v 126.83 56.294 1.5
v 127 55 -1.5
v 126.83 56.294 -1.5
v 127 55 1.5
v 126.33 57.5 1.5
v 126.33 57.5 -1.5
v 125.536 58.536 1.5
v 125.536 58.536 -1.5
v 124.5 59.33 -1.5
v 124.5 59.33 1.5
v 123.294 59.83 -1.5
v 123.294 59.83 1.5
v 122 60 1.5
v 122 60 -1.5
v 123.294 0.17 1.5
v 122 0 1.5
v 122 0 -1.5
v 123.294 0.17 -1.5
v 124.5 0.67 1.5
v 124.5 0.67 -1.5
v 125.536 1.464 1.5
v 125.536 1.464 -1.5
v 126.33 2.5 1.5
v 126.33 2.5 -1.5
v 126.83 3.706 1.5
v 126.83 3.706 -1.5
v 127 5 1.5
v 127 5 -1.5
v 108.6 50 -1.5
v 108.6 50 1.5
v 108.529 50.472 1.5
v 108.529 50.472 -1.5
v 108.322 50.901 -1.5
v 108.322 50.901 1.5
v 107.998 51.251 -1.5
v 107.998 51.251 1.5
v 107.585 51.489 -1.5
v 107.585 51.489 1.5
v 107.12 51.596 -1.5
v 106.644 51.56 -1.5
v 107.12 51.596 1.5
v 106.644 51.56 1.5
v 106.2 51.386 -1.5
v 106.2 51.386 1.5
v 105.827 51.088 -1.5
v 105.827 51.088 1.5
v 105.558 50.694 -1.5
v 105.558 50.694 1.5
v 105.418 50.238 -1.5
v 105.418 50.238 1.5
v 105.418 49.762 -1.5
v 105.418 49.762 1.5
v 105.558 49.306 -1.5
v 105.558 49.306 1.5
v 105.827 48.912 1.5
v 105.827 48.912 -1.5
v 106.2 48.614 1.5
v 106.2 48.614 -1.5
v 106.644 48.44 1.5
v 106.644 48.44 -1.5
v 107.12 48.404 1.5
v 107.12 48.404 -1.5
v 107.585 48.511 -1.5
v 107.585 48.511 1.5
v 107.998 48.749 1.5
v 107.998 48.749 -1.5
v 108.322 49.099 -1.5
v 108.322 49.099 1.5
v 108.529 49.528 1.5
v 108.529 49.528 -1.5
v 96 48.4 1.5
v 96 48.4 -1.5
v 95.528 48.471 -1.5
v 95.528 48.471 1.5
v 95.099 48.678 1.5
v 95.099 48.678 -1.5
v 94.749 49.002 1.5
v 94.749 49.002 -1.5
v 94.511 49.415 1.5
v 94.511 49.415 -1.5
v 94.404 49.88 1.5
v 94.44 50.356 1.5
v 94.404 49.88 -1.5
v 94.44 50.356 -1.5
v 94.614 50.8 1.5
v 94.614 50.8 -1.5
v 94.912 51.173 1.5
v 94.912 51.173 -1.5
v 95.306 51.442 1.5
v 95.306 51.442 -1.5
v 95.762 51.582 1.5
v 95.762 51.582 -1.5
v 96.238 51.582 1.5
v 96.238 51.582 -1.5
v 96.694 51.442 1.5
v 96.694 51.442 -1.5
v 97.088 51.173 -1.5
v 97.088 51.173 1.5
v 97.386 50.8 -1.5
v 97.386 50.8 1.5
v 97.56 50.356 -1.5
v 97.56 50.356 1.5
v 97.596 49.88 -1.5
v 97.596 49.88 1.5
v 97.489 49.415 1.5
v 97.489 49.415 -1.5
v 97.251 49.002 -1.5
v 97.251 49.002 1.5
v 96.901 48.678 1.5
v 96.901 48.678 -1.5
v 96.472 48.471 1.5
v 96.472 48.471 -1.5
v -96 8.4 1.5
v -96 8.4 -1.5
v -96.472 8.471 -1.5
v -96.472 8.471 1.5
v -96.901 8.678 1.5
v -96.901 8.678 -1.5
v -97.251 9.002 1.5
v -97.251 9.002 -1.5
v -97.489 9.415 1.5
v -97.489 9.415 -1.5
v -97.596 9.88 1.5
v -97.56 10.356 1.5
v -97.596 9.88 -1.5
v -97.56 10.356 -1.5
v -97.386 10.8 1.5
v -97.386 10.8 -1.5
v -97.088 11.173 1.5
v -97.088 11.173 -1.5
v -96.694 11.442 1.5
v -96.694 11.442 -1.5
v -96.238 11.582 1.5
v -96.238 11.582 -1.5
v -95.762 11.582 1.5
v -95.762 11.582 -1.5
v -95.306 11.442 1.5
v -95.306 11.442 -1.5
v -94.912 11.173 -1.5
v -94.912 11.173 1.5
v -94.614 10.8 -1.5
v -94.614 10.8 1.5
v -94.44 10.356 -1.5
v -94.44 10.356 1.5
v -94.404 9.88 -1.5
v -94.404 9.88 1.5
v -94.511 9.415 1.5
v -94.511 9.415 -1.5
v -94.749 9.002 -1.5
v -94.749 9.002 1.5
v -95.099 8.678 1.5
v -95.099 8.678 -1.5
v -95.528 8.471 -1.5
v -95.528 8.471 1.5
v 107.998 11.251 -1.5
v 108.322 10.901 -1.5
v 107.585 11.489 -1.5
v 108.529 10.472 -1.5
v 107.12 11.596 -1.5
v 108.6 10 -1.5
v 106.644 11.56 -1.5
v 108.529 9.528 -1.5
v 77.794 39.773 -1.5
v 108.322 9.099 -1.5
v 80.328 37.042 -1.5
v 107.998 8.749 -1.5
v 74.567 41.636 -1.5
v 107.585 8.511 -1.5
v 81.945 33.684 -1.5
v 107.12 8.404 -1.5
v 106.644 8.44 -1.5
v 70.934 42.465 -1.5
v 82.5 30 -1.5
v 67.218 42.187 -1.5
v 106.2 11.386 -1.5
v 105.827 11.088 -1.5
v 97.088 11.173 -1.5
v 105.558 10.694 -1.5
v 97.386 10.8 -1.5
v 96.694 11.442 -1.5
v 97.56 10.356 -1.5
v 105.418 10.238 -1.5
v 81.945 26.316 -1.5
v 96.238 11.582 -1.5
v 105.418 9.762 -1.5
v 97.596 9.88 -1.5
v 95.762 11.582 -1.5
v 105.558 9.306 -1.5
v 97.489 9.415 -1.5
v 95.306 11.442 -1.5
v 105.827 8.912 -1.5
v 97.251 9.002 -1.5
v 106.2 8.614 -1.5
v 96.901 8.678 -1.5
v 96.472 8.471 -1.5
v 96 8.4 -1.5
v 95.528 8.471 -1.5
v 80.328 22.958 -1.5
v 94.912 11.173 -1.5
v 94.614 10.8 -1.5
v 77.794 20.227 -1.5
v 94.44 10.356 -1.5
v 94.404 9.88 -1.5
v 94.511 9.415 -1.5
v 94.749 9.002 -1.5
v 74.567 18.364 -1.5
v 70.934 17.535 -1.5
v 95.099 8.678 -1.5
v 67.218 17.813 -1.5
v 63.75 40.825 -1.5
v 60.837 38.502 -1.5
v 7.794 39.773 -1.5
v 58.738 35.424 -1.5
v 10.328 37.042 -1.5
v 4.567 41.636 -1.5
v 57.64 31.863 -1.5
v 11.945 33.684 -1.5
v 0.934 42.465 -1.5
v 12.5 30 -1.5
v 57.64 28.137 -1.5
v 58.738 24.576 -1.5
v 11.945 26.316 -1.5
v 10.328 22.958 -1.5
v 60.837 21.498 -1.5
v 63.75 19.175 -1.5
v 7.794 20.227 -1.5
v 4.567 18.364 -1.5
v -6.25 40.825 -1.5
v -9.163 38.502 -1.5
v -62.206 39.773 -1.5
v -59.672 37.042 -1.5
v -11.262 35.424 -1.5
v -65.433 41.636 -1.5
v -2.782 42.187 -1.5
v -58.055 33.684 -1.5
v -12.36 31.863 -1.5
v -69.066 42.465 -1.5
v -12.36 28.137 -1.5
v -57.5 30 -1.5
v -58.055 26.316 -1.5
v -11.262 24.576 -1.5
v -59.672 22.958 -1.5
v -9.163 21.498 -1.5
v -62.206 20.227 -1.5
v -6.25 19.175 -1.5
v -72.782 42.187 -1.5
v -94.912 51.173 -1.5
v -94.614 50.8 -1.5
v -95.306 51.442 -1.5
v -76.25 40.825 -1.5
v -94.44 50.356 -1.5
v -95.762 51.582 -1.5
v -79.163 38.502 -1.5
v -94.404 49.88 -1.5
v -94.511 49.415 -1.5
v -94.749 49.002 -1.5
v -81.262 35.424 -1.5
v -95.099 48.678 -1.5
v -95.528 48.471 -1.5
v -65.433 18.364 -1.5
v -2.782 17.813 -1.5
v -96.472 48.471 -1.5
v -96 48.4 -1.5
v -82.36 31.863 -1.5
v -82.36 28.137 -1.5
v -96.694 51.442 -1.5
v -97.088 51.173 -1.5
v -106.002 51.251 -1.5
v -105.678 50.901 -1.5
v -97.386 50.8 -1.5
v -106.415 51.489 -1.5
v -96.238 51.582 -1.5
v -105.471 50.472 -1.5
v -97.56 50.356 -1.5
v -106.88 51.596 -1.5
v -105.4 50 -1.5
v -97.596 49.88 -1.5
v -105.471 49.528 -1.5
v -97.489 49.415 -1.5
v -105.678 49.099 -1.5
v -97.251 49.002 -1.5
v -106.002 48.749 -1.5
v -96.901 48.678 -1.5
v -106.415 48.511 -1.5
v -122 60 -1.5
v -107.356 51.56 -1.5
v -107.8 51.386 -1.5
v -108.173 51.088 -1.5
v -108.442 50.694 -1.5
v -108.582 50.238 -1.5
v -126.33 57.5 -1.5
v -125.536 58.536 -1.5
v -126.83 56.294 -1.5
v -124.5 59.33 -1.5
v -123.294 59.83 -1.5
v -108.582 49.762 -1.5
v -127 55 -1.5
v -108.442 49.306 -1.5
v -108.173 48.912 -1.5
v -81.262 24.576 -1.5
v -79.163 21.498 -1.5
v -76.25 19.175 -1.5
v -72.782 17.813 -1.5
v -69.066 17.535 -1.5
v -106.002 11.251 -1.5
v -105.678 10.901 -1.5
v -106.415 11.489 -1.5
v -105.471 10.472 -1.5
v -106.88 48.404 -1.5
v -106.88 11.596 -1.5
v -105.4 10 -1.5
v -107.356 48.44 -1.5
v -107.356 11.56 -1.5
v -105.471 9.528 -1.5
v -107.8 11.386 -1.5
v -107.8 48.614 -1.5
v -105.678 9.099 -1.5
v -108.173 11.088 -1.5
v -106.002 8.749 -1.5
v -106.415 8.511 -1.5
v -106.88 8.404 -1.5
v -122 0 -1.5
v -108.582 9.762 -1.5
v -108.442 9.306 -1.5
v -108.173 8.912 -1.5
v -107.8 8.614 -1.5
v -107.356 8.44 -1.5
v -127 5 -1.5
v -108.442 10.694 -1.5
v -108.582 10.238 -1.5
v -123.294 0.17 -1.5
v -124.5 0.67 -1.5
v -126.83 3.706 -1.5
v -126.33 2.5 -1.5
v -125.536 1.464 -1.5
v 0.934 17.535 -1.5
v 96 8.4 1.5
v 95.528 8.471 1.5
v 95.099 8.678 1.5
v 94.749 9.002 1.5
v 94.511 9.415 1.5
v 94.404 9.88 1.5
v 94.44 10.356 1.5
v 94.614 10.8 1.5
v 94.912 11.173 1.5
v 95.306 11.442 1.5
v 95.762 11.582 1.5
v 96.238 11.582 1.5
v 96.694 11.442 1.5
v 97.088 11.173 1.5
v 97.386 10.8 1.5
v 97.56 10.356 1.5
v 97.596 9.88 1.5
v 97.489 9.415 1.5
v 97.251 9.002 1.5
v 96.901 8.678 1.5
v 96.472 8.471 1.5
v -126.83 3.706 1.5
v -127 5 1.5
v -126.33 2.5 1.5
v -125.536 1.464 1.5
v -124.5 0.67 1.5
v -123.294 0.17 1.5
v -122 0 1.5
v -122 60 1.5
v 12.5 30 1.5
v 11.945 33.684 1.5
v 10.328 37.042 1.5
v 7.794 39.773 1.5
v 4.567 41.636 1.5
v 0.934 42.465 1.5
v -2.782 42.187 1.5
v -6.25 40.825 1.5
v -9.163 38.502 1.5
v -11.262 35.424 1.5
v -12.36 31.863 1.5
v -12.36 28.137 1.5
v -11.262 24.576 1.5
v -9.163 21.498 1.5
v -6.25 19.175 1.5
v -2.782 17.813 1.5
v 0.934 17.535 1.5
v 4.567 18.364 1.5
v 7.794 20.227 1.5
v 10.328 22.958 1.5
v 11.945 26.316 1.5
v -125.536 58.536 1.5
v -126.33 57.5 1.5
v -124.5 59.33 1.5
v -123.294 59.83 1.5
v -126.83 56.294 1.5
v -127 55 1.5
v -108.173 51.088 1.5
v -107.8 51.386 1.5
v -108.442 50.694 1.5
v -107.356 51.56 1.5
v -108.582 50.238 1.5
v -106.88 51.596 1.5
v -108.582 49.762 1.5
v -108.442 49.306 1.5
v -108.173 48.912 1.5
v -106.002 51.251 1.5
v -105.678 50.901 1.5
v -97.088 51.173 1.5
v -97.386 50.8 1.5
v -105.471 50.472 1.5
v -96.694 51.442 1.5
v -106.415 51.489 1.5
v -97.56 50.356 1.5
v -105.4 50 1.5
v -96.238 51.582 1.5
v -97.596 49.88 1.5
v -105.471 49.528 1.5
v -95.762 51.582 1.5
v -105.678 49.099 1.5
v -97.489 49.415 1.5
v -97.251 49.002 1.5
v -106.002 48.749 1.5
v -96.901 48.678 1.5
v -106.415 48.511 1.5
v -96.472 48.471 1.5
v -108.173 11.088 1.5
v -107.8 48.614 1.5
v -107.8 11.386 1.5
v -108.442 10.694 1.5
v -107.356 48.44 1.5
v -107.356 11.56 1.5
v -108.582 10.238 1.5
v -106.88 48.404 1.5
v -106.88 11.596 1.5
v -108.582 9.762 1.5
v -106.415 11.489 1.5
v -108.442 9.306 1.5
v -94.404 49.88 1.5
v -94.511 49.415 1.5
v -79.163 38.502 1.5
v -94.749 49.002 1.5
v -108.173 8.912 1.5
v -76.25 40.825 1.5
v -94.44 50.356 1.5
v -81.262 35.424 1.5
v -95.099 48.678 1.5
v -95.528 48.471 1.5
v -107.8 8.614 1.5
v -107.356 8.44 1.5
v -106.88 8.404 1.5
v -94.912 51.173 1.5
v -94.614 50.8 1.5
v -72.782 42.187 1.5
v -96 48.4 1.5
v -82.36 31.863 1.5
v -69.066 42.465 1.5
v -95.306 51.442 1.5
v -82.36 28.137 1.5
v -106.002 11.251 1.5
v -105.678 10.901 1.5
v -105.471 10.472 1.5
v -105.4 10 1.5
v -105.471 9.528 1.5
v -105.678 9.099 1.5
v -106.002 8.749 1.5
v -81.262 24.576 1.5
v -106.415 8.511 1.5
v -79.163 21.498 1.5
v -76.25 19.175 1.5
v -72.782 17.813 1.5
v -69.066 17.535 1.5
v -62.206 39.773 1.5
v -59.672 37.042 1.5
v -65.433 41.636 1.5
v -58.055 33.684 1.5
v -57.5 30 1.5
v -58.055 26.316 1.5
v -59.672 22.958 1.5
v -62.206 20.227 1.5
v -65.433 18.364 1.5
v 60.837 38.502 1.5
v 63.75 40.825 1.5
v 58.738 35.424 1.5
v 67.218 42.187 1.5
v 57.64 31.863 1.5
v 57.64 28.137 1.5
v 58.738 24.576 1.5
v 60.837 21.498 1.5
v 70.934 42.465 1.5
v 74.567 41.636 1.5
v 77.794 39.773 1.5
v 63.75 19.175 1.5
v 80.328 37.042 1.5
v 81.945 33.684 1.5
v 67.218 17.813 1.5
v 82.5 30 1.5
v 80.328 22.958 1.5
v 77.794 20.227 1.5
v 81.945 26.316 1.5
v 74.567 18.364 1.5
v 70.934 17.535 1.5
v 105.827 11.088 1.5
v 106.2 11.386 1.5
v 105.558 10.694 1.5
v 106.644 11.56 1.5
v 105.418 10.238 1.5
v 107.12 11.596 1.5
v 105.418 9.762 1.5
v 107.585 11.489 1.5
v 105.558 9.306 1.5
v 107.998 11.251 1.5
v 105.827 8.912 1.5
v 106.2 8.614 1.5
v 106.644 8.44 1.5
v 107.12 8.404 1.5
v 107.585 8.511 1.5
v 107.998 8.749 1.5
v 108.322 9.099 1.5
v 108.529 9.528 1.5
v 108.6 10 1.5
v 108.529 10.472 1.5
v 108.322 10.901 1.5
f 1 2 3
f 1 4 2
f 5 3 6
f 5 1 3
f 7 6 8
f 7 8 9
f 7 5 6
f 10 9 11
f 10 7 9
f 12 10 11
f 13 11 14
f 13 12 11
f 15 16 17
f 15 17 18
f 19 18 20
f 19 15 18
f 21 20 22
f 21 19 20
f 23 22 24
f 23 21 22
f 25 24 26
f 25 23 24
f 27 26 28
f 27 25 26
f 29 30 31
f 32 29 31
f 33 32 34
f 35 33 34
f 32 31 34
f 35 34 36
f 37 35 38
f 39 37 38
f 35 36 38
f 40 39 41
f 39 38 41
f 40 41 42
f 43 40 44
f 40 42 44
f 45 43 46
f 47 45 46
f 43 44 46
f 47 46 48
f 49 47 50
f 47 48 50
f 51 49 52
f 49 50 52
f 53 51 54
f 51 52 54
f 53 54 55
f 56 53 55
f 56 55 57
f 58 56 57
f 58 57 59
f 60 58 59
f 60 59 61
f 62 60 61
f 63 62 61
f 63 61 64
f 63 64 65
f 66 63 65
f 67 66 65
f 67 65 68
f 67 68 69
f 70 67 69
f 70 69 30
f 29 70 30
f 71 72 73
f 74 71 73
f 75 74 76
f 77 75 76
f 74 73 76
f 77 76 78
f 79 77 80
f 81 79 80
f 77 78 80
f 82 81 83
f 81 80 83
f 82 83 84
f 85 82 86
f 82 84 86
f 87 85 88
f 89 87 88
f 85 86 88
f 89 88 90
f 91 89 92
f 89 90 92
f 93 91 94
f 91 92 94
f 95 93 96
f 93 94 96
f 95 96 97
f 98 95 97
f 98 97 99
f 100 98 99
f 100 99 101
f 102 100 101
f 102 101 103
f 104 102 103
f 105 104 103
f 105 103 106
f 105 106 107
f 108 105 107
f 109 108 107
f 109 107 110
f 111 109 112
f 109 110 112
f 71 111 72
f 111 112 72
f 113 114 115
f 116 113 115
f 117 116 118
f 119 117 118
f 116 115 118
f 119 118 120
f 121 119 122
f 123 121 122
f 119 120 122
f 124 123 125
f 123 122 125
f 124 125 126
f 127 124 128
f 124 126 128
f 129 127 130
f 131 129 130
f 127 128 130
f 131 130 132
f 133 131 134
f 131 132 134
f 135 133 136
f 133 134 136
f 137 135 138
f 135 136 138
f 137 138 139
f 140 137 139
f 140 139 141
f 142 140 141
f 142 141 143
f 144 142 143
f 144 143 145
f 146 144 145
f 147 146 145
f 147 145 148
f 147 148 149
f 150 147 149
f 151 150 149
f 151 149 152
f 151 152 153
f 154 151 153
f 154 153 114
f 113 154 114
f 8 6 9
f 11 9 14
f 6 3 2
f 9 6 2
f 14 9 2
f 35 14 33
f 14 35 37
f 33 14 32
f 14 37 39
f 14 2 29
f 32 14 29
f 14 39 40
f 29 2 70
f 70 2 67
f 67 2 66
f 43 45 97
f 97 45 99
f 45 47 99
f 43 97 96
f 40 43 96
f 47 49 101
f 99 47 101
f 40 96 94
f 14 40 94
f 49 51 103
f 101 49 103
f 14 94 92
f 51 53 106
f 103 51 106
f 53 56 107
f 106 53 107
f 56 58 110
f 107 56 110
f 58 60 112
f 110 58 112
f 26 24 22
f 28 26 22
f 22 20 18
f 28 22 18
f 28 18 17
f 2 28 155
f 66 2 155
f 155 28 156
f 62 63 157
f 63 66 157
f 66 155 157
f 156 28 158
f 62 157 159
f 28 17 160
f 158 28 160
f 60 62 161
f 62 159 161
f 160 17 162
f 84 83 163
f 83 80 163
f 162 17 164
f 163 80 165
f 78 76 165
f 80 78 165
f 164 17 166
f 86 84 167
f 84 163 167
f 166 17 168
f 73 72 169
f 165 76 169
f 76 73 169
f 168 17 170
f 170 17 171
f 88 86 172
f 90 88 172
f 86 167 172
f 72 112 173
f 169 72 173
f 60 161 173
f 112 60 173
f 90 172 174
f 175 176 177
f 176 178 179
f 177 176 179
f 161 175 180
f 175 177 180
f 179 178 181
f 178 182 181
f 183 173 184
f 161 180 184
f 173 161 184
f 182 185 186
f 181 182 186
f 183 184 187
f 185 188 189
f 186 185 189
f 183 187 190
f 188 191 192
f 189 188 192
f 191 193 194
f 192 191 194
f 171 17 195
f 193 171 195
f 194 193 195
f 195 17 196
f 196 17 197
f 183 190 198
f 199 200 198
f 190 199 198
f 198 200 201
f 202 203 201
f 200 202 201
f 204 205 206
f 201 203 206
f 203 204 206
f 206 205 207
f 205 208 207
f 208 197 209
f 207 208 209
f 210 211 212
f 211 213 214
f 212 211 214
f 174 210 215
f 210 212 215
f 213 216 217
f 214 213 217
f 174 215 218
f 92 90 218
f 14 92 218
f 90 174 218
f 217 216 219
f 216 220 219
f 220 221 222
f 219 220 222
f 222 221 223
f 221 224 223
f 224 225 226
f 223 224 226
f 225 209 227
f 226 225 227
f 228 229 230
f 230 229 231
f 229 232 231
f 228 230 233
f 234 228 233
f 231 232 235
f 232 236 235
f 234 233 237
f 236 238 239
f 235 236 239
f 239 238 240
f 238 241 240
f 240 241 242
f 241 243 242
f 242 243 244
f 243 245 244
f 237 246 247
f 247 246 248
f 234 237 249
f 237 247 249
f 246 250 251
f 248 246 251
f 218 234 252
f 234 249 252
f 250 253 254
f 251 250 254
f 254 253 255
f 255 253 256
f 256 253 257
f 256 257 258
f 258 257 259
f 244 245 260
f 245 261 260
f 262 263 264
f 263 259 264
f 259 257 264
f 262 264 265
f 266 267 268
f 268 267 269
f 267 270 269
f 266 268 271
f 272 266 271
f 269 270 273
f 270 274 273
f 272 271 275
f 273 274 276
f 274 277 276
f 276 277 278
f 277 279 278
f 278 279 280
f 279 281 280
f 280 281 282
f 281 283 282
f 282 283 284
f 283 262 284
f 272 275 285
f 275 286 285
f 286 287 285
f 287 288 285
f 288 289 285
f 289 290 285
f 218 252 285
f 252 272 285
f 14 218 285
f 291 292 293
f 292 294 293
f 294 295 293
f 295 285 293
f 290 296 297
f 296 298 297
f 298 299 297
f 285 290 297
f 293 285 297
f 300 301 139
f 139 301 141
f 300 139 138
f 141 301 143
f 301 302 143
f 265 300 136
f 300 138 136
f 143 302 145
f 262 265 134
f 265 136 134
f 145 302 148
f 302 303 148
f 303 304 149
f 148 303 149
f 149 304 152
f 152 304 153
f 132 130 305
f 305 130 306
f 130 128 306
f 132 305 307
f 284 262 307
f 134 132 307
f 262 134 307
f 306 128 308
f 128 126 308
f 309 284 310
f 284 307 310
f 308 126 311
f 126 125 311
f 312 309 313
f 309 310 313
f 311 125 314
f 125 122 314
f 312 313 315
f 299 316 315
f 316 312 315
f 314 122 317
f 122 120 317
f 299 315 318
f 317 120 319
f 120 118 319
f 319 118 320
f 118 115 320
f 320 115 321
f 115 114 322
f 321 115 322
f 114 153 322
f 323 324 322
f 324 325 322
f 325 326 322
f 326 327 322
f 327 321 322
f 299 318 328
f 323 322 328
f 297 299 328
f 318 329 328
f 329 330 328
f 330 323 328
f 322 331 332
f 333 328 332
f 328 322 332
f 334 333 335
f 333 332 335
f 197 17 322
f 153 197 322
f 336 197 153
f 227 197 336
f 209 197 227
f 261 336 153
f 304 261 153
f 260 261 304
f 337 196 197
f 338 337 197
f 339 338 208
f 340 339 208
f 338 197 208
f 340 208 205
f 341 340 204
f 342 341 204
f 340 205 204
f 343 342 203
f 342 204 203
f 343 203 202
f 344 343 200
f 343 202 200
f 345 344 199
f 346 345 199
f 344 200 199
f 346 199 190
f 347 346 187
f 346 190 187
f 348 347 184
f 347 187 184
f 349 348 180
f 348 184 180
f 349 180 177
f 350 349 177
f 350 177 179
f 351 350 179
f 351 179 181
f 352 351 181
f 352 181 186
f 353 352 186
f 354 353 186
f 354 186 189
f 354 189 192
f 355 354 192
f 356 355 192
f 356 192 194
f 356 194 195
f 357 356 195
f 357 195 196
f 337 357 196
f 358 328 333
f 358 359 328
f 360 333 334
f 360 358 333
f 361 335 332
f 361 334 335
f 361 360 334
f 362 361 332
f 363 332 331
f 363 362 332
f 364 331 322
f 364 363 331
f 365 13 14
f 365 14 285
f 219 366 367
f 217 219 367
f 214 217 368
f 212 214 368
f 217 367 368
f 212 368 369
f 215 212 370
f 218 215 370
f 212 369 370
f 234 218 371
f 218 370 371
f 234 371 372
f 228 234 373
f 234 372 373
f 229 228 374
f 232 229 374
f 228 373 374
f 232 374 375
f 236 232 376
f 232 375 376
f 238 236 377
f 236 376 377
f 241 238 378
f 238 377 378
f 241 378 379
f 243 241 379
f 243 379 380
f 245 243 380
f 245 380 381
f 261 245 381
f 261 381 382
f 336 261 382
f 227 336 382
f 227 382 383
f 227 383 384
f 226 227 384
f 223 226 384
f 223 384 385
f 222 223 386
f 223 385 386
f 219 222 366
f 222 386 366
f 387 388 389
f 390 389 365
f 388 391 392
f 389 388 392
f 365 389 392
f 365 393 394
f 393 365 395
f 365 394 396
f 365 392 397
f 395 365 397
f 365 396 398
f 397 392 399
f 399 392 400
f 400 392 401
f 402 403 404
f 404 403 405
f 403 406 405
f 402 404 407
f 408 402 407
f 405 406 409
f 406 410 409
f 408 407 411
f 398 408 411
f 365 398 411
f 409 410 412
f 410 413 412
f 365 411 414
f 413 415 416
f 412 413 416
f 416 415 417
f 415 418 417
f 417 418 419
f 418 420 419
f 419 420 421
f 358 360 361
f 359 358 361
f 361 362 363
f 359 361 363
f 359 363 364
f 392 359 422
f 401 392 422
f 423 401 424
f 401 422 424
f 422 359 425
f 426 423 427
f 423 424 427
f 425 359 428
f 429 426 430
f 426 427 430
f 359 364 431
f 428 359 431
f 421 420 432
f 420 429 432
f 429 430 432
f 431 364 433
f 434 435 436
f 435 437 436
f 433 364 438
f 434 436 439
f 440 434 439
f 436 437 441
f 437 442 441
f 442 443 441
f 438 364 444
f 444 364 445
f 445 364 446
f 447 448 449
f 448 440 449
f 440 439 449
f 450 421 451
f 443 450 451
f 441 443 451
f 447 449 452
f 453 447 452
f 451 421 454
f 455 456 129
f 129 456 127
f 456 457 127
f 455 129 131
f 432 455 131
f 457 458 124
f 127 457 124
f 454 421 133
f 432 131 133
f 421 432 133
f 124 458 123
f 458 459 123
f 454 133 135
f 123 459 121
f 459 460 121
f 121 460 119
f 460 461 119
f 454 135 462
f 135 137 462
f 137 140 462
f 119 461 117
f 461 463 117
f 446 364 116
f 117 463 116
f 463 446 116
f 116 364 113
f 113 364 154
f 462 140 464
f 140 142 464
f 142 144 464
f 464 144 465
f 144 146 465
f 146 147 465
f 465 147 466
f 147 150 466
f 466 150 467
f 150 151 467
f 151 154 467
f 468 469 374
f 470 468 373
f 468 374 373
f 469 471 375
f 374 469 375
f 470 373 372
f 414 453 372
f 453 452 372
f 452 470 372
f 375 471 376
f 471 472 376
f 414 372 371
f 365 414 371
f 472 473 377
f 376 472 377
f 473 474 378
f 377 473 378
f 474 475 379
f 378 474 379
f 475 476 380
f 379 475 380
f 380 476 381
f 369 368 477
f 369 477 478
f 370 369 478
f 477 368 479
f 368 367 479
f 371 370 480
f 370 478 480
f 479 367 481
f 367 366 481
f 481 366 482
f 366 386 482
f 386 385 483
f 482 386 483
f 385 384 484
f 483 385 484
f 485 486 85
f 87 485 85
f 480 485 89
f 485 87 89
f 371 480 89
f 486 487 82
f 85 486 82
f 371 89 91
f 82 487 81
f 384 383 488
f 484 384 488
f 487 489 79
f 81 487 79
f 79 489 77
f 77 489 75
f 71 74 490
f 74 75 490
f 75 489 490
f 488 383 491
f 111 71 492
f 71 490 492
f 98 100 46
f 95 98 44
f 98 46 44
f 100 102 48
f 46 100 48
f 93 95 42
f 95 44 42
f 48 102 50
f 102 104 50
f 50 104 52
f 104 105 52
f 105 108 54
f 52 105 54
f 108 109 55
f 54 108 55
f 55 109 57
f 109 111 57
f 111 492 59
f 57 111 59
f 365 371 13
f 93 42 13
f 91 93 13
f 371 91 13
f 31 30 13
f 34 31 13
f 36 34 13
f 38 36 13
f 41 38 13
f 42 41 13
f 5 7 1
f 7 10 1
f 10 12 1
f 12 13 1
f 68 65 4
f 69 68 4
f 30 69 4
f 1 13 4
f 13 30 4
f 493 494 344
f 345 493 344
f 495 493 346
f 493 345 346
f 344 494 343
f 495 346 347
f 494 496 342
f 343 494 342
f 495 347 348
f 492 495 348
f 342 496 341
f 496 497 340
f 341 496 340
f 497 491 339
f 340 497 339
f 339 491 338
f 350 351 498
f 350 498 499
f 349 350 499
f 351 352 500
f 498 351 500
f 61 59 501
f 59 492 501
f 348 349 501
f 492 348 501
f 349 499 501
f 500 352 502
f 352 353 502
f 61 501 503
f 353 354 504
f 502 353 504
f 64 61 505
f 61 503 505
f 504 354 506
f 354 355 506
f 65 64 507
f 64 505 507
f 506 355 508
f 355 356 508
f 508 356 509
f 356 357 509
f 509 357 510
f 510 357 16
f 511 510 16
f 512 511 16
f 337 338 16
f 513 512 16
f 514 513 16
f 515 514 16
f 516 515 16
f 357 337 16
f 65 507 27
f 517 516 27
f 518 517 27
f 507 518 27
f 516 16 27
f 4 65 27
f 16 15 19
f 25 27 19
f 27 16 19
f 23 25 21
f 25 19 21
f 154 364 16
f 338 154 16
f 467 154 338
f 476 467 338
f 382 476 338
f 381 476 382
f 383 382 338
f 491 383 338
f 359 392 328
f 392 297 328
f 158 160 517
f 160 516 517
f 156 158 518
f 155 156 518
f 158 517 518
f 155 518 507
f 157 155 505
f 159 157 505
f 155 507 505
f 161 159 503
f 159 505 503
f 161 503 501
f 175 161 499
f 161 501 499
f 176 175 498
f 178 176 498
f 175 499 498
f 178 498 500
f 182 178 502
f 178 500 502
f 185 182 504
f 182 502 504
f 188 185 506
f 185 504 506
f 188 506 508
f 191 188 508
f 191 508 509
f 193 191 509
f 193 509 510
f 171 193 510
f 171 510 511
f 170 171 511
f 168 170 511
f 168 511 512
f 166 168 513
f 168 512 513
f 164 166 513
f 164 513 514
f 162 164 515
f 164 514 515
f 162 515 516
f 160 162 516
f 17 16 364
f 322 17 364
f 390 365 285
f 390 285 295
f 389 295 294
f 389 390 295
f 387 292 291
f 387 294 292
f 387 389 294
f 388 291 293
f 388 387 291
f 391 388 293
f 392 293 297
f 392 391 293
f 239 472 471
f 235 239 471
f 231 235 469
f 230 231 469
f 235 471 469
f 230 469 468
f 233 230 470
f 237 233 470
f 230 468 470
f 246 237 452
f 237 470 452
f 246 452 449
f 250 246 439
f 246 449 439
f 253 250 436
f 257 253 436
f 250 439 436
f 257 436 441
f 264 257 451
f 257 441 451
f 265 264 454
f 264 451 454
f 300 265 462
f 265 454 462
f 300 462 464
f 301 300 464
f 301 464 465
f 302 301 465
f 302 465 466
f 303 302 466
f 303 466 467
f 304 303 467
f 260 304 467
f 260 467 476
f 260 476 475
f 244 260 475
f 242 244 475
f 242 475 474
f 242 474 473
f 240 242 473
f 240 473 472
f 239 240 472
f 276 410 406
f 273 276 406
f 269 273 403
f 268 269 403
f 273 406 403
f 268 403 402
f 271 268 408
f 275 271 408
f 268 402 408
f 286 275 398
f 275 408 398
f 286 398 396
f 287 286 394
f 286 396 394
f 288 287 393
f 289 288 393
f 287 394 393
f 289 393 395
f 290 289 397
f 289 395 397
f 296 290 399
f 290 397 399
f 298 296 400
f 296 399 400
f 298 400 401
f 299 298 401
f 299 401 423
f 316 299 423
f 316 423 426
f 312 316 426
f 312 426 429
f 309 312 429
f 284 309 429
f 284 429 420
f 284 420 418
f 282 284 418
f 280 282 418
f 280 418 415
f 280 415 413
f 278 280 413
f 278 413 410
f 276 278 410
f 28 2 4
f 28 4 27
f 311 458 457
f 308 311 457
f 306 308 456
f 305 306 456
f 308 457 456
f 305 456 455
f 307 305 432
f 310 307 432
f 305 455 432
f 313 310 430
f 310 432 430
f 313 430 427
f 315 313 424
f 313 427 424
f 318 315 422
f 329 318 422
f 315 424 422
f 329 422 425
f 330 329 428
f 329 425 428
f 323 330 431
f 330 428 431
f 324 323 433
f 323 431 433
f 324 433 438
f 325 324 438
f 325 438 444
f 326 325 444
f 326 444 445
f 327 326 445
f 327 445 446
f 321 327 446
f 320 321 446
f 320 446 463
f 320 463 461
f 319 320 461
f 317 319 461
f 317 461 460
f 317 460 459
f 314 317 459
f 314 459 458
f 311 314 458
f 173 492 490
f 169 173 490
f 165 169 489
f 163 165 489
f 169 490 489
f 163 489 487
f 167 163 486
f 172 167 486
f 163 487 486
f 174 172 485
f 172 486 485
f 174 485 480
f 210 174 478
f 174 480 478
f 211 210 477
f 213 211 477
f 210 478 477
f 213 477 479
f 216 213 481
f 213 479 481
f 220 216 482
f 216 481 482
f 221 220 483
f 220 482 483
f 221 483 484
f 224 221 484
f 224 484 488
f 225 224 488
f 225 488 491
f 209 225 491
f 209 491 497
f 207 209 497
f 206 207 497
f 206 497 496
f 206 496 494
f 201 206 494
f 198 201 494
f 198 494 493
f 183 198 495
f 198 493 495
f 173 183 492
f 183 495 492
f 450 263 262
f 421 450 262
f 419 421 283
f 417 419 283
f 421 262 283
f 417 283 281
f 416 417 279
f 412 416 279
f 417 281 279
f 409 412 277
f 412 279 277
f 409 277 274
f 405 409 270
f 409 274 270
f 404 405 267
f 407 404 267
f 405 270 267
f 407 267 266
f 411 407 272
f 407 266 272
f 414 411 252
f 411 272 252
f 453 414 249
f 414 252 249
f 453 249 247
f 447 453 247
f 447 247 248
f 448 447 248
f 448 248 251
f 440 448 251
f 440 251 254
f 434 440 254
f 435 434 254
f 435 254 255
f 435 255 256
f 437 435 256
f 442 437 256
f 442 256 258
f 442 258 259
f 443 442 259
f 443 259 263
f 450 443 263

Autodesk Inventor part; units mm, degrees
ref_plane "YZ Plane" through (0, 0, 0) normal (1, 0, 0) x (0, 1, 0)
ref_plane "XZ Plane" through (0, 0, 0) normal (0, 1, 0) x (-1, 0, 0)
ref_plane "XY Plane" through (0, 0, 0) normal (0, 0, 1) x (1, 0, 0)
sketch "スケッチ1" plane through (0, 0, 0) normal (0, 1, 0) x (-1, 0, 0)
  line L0 (130, 1.5) -> (-130, 1.5)
  line L1 (-130, 1.5) -> (-130, -1.5)
  line L2 (-130, -1.5) -> (130, -1.5)
  line L3 (130, -1.5) -> (130, 1.5)
  line L4 (130, 1.5) -> (-130, -1.5) construction
  line L5 (-130, 1.5) -> (130, -1.5) construction
  point P0 (0, 0)
  dimension "d0" = 260
  dimension "d1" = 3
extrude "押し出し1" add sketch "スケッチ1" along normal blind 60
sketch "スケッチ3" plane through (-130, 0, 1.5) normal (0, 0, 1) x (1, 0, 0)
  circle A0 centre (60, 30) radius 12.5
  circle A1 centre (130, 30) radius 12.5
  circle A2 centre (200, 30) radius 12.5
  line L0 (0, 0) -> (0, 60) projected
  line L1 (260, 0) -> (260, 60) projected
  point P0 (130, 0)
  point P1 (0, 30)
  point P2 (260, 30)
  dimension "d10" = 25
  dimension "d11" = 25
  dimension "d12" = 25
  dimension "d15" = 60
  dimension "d16" = 60
  dimension "d18" = 0
  dimension "d21" = 0
extrude "押し出し3" cut sketch "スケッチ3" against normal through all
sketch "スケッチ5" plane through (130, 0, -1.5) normal (0, 0, -1) x (-1, 0, 0)
  line L0 (0, 0) -> (260, 0) projected
  line L1 (0, 60) -> (3, 60)
  line L2 (3, 60) -> (3, 0)
  line L3 (3, 0) -> (0, 0)
  line L4 (0, 0) -> (0, 60)
  line L5 (0, 45) -> (3, 45)
  line L6 (3, 45) -> (3, 15)
  line L7 (3, 15) -> (0, 15)
  line L8 (0, 15) -> (0, 45)
  line L9 (0, 60) -> (260, 60) projected
  line L10 (130, 60) -> (130, 0)
  line L11 (260, 0) -> (0, 0)
  line L12 (260, 60) -> (257, 60)
  line L13 (257, 60) -> (257, 0)
  line L14 (260, 0) -> (260, 60)
  line L15 (260, 45) -> (257, 45)
  line L16 (257, 15) -> (260, 15)
  point P0 (1.5, 45)
  point P1 (1.5, 60)
  point P2 (1.5, 15)
  point P3 (1.5, 0)
  point P4 (258.5, 15)
  point P5 (257, 0)
  point P6 (257, 60)
  point P7 (0, 15)
  point P8 (3, 45)
  dimension "d22" = 3
  dimension "d23" = 15
  dimension "d24" = 15
extrude "押し出し4" cut sketch "スケッチ5" against normal through all contours L4 L7 L2 L0 | L4 L5 L2 L7 | L4 L1 L2 L5 | L13 L16 L14 L0 | L13 L15 L14 L16 | L9 L14 L15 L13
sketch "スケッチ8" plane through (-127, 0, 1.5) normal (0, 0, 1) x (1, 0, 0)
  circle A0 centre (20, 50) radius 1.6
  circle A1 centre (20, 10) radius 1.6
  line L0 (0, 60) -> (0, 0) projected
  line L1 (0, 60) -> (254, 60) projected
  line L2 (0, 0) -> (254, 0) projected
  line L3 (127, 60) -> (127, 0)
  circle A2 centre (234, 50) radius 1.6
  circle A3 centre (234, 10) radius 1.6
  dimension "d31" = 20
  dimension "d32" = 10
  dimension "d33" = 20
  dimension "d34" = 10
  dimension "d35" = 3.2
  dimension "d36" = 3.2
extrude "押し出し7" cut sketch "スケッチ8" against normal through all contours A0 | A1 | A2 | A3
fillet "フィレット1" radius 5 4 edges at (-127, 60, 0) (-127, 0, 0) (127, 60, 0) (127, 0, 0)
sketch "スケッチ13" plane through (-122, 0, 1.5) normal (0, 0, 1) x (1, 0, 0)
  line L0 (244, 60) -> (0, 60) projected
  line L1 (122, 60) -> (122, 0)
  circle A0 centre (15, 50) radius 1.6 projected
  circle A1 centre (15, 10) radius 1.6 projected
  point P0 (26, 50)
  point P1 (26, 10)
  point P2 (218, 50)
  point P3 (218, 10)
  dimension "d60" = 11
  dimension "d61" = 11
  dimension "d62" = 40
  dimension "d63" = 10
hole "穴1" at (-96, 50, 1.5) at (-96, 10, 1.5) at (96, 50, 1.5) at (96, 10, 1.5) direction (0, 0, -1) diameter 3.2 end through all
equation "\"d36\" = d35"
equation "\"d61\" = d60"
properties part number "BP_BOX-Front-60" material "アセタール樹脂、白"
